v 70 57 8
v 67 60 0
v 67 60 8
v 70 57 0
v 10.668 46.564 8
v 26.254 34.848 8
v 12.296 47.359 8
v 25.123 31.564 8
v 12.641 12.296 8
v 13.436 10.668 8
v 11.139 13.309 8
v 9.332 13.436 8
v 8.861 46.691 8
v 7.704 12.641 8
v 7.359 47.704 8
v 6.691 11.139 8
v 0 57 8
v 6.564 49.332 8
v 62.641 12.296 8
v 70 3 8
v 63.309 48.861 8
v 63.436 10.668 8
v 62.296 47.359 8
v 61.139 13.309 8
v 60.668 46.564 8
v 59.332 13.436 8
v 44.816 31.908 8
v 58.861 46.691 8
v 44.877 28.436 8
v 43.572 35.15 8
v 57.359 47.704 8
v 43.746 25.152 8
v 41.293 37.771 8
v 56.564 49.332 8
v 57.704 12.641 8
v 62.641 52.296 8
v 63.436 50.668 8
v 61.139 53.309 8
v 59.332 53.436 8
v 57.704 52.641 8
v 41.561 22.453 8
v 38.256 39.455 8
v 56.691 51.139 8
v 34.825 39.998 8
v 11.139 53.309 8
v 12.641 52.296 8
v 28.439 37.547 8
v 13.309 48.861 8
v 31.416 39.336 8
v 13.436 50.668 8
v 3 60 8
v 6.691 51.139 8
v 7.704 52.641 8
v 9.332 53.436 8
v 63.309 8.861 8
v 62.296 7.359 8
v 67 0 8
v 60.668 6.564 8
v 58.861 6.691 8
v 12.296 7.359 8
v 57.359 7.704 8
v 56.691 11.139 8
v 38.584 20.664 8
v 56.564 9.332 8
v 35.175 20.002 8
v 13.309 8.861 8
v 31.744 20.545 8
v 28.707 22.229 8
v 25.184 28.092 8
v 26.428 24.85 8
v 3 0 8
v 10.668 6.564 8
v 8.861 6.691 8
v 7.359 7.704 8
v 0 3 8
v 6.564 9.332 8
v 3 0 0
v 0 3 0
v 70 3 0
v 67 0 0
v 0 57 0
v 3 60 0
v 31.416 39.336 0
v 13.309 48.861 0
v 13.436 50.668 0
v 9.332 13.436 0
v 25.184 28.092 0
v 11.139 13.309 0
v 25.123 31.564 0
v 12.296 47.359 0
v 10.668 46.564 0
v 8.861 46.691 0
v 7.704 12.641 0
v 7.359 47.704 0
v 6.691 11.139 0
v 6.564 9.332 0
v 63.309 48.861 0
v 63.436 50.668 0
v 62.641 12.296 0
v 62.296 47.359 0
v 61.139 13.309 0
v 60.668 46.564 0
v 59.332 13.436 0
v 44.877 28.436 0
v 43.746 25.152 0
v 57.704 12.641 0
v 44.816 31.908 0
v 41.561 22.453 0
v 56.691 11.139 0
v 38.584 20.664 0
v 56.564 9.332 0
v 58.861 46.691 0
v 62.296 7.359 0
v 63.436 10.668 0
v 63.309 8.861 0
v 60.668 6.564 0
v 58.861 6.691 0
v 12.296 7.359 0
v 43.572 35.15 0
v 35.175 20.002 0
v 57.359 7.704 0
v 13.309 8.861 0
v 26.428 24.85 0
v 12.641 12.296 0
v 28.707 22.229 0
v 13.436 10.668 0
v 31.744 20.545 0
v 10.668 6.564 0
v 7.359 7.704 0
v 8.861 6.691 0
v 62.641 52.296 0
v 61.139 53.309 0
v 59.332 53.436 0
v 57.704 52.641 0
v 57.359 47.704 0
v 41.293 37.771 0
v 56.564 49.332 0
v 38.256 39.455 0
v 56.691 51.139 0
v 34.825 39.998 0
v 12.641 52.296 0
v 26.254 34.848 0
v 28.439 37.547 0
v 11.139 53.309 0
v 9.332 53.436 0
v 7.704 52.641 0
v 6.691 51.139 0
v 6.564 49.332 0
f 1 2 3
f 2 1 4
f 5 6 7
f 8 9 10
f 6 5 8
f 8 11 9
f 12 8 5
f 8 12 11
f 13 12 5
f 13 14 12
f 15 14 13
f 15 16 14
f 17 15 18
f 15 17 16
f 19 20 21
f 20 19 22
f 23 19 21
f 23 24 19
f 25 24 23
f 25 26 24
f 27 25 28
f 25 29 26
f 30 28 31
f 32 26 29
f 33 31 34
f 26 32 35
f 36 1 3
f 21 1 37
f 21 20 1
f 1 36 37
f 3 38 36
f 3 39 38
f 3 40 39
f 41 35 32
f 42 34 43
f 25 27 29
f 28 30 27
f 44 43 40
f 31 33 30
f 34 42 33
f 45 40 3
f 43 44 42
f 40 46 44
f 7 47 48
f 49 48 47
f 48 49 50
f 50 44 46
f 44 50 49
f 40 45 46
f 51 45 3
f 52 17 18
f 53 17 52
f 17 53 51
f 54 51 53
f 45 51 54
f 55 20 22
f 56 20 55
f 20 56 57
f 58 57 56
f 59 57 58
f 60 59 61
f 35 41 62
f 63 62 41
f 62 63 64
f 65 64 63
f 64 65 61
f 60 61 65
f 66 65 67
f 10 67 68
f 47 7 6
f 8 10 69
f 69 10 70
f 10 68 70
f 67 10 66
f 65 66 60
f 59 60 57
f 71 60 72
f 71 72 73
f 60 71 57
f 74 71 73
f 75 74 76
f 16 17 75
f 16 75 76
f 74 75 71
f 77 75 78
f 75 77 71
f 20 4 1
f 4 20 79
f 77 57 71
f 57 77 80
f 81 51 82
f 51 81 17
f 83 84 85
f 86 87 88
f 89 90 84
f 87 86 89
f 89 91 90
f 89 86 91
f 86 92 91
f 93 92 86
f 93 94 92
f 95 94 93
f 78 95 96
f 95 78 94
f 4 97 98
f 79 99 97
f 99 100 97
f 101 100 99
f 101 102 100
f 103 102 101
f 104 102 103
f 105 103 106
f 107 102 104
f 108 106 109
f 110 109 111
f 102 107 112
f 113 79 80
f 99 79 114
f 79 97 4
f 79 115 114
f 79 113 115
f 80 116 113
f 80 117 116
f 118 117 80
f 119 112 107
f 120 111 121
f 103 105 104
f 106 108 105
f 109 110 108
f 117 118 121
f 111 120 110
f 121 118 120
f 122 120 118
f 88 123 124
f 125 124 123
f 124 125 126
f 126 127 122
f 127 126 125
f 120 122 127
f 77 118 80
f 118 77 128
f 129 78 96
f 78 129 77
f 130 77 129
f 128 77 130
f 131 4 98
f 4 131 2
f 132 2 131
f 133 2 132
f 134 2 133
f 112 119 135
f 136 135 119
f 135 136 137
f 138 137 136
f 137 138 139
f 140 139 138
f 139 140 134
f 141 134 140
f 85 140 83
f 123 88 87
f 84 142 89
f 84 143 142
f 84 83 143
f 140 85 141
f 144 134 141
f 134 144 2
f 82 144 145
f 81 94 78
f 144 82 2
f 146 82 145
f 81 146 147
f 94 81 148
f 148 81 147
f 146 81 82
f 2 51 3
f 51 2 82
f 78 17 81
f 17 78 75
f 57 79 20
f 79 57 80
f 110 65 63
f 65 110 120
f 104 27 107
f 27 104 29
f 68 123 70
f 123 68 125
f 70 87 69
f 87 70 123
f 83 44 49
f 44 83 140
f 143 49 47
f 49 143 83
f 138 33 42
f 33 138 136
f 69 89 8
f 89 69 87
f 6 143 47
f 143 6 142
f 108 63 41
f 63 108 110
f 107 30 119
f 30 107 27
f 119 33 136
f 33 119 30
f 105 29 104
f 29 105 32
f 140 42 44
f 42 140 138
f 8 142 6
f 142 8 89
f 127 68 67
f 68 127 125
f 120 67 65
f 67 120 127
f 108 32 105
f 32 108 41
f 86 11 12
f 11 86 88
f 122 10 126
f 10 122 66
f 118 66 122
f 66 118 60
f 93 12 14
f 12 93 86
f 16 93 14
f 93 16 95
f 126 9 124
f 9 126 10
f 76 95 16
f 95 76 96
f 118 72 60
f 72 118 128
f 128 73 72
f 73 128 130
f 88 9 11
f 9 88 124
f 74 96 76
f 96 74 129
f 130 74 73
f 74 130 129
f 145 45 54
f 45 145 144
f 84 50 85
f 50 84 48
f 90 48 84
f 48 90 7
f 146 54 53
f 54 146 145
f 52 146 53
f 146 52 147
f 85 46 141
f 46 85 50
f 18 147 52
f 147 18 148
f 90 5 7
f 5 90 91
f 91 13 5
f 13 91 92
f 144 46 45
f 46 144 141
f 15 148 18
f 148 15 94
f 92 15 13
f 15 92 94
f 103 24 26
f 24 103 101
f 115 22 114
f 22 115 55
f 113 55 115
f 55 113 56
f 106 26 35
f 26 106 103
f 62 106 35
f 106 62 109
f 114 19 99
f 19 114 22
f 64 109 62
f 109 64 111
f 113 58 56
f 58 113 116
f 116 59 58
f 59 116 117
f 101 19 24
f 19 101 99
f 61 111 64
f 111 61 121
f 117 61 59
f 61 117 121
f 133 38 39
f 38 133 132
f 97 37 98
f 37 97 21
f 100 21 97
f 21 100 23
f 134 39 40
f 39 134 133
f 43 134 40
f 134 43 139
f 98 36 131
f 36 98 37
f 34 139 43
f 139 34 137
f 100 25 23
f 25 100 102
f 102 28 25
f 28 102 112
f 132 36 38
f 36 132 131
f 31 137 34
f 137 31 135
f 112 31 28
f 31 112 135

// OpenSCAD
$fn = 32;

// ----------------------------------------------------------------------
// Spacer plate: rect 70 x 60
// ----------------------------------------------------------------------

// --- parameters (mm) ---
bore_r = 10;              // centre bore radius
bolt_r = 3.5;             // bolt hole radius
plate_t = 8;              // plate thickness, Z (extrusion height)
plate_l = 70;             // plate length, X
plate_w = 60;             // plate width, Y
inset = 10;               // corner hole inset
fit_tol = 0.1;            // declared fit tolerance (prompt contract)
free_tol = 0.5;           // declared free tolerance (prompt contract)

profile = [[3, 0], [67, 0], [70, 3], [70, 57], [67, 60], [3, 60], [0, 57], [0, 3]];  // primary outline, 8 points, counter clockwise
void_1 = [[44.816, 31.908], [43.572, 35.15], [41.293, 37.771], [38.256, 39.455], [34.825, 39.998], [31.416, 39.336], [28.439, 37.547], [26.254, 34.848], [25.123, 31.564], [25.184, 28.092], [26.428, 24.85], [28.707, 22.229], [31.744, 20.545], [35.175, 20.002], [38.584, 20.664], [41.561, 22.453], [43.746, 25.152], [44.877, 28.436]];  // centre bore, 18 points
void_2 = [[13.436, 10.668], [12.641, 12.296], [11.139, 13.309], [9.332, 13.436], [7.704, 12.641], [6.691, 11.139], [6.564, 9.332], [7.359, 7.704], [8.861, 6.691], [10.668, 6.564], [12.296, 7.359], [13.309, 8.861]];  // corner hole, 12 points
void_3 = [[13.436, 50.668], [12.641, 52.296], [11.139, 53.309], [9.332, 53.436], [7.704, 52.641], [6.691, 51.139], [6.564, 49.332], [7.359, 47.704], [8.861, 46.691], [10.668, 46.564], [12.296, 47.359], [13.309, 48.861]];  // corner hole, 12 points
void_4 = [[63.436, 10.668], [62.641, 12.296], [61.139, 13.309], [59.332, 13.436], [57.704, 12.641], [56.691, 11.139], [56.564, 9.332], [57.359, 7.704], [58.861, 6.691], [60.668, 6.564], [62.296, 7.359], [63.309, 8.861]];  // corner hole, 12 points
void_5 = [[63.436, 50.668], [62.641, 52.296], [61.139, 53.309], [59.332, 53.436], [57.704, 52.641], [56.691, 51.139], [56.564, 49.332], [57.359, 47.704], [58.861, 46.691], [60.668, 46.564], [62.296, 47.359], [63.309, 48.861]];  // corner hole, 12 points

// --- the one profile operation ---
difference() {
  linear_extrude(height = plate_t) polygon(points = profile);
  translate([0, 0, -1])
    linear_extrude(height = plate_t + 2) polygon(points = void_1);
  translate([0, 0, -1])
    linear_extrude(height = plate_t + 2) polygon(points = void_2);
  translate([0, 0, -1])
    linear_extrude(height = plate_t + 2) polygon(points = void_3);
  translate([0, 0, -1])
    linear_extrude(height = plate_t + 2) polygon(points = void_4);
  translate([0, 0, -1])
    linear_extrude(height = plate_t + 2) polygon(points = void_5);
}
